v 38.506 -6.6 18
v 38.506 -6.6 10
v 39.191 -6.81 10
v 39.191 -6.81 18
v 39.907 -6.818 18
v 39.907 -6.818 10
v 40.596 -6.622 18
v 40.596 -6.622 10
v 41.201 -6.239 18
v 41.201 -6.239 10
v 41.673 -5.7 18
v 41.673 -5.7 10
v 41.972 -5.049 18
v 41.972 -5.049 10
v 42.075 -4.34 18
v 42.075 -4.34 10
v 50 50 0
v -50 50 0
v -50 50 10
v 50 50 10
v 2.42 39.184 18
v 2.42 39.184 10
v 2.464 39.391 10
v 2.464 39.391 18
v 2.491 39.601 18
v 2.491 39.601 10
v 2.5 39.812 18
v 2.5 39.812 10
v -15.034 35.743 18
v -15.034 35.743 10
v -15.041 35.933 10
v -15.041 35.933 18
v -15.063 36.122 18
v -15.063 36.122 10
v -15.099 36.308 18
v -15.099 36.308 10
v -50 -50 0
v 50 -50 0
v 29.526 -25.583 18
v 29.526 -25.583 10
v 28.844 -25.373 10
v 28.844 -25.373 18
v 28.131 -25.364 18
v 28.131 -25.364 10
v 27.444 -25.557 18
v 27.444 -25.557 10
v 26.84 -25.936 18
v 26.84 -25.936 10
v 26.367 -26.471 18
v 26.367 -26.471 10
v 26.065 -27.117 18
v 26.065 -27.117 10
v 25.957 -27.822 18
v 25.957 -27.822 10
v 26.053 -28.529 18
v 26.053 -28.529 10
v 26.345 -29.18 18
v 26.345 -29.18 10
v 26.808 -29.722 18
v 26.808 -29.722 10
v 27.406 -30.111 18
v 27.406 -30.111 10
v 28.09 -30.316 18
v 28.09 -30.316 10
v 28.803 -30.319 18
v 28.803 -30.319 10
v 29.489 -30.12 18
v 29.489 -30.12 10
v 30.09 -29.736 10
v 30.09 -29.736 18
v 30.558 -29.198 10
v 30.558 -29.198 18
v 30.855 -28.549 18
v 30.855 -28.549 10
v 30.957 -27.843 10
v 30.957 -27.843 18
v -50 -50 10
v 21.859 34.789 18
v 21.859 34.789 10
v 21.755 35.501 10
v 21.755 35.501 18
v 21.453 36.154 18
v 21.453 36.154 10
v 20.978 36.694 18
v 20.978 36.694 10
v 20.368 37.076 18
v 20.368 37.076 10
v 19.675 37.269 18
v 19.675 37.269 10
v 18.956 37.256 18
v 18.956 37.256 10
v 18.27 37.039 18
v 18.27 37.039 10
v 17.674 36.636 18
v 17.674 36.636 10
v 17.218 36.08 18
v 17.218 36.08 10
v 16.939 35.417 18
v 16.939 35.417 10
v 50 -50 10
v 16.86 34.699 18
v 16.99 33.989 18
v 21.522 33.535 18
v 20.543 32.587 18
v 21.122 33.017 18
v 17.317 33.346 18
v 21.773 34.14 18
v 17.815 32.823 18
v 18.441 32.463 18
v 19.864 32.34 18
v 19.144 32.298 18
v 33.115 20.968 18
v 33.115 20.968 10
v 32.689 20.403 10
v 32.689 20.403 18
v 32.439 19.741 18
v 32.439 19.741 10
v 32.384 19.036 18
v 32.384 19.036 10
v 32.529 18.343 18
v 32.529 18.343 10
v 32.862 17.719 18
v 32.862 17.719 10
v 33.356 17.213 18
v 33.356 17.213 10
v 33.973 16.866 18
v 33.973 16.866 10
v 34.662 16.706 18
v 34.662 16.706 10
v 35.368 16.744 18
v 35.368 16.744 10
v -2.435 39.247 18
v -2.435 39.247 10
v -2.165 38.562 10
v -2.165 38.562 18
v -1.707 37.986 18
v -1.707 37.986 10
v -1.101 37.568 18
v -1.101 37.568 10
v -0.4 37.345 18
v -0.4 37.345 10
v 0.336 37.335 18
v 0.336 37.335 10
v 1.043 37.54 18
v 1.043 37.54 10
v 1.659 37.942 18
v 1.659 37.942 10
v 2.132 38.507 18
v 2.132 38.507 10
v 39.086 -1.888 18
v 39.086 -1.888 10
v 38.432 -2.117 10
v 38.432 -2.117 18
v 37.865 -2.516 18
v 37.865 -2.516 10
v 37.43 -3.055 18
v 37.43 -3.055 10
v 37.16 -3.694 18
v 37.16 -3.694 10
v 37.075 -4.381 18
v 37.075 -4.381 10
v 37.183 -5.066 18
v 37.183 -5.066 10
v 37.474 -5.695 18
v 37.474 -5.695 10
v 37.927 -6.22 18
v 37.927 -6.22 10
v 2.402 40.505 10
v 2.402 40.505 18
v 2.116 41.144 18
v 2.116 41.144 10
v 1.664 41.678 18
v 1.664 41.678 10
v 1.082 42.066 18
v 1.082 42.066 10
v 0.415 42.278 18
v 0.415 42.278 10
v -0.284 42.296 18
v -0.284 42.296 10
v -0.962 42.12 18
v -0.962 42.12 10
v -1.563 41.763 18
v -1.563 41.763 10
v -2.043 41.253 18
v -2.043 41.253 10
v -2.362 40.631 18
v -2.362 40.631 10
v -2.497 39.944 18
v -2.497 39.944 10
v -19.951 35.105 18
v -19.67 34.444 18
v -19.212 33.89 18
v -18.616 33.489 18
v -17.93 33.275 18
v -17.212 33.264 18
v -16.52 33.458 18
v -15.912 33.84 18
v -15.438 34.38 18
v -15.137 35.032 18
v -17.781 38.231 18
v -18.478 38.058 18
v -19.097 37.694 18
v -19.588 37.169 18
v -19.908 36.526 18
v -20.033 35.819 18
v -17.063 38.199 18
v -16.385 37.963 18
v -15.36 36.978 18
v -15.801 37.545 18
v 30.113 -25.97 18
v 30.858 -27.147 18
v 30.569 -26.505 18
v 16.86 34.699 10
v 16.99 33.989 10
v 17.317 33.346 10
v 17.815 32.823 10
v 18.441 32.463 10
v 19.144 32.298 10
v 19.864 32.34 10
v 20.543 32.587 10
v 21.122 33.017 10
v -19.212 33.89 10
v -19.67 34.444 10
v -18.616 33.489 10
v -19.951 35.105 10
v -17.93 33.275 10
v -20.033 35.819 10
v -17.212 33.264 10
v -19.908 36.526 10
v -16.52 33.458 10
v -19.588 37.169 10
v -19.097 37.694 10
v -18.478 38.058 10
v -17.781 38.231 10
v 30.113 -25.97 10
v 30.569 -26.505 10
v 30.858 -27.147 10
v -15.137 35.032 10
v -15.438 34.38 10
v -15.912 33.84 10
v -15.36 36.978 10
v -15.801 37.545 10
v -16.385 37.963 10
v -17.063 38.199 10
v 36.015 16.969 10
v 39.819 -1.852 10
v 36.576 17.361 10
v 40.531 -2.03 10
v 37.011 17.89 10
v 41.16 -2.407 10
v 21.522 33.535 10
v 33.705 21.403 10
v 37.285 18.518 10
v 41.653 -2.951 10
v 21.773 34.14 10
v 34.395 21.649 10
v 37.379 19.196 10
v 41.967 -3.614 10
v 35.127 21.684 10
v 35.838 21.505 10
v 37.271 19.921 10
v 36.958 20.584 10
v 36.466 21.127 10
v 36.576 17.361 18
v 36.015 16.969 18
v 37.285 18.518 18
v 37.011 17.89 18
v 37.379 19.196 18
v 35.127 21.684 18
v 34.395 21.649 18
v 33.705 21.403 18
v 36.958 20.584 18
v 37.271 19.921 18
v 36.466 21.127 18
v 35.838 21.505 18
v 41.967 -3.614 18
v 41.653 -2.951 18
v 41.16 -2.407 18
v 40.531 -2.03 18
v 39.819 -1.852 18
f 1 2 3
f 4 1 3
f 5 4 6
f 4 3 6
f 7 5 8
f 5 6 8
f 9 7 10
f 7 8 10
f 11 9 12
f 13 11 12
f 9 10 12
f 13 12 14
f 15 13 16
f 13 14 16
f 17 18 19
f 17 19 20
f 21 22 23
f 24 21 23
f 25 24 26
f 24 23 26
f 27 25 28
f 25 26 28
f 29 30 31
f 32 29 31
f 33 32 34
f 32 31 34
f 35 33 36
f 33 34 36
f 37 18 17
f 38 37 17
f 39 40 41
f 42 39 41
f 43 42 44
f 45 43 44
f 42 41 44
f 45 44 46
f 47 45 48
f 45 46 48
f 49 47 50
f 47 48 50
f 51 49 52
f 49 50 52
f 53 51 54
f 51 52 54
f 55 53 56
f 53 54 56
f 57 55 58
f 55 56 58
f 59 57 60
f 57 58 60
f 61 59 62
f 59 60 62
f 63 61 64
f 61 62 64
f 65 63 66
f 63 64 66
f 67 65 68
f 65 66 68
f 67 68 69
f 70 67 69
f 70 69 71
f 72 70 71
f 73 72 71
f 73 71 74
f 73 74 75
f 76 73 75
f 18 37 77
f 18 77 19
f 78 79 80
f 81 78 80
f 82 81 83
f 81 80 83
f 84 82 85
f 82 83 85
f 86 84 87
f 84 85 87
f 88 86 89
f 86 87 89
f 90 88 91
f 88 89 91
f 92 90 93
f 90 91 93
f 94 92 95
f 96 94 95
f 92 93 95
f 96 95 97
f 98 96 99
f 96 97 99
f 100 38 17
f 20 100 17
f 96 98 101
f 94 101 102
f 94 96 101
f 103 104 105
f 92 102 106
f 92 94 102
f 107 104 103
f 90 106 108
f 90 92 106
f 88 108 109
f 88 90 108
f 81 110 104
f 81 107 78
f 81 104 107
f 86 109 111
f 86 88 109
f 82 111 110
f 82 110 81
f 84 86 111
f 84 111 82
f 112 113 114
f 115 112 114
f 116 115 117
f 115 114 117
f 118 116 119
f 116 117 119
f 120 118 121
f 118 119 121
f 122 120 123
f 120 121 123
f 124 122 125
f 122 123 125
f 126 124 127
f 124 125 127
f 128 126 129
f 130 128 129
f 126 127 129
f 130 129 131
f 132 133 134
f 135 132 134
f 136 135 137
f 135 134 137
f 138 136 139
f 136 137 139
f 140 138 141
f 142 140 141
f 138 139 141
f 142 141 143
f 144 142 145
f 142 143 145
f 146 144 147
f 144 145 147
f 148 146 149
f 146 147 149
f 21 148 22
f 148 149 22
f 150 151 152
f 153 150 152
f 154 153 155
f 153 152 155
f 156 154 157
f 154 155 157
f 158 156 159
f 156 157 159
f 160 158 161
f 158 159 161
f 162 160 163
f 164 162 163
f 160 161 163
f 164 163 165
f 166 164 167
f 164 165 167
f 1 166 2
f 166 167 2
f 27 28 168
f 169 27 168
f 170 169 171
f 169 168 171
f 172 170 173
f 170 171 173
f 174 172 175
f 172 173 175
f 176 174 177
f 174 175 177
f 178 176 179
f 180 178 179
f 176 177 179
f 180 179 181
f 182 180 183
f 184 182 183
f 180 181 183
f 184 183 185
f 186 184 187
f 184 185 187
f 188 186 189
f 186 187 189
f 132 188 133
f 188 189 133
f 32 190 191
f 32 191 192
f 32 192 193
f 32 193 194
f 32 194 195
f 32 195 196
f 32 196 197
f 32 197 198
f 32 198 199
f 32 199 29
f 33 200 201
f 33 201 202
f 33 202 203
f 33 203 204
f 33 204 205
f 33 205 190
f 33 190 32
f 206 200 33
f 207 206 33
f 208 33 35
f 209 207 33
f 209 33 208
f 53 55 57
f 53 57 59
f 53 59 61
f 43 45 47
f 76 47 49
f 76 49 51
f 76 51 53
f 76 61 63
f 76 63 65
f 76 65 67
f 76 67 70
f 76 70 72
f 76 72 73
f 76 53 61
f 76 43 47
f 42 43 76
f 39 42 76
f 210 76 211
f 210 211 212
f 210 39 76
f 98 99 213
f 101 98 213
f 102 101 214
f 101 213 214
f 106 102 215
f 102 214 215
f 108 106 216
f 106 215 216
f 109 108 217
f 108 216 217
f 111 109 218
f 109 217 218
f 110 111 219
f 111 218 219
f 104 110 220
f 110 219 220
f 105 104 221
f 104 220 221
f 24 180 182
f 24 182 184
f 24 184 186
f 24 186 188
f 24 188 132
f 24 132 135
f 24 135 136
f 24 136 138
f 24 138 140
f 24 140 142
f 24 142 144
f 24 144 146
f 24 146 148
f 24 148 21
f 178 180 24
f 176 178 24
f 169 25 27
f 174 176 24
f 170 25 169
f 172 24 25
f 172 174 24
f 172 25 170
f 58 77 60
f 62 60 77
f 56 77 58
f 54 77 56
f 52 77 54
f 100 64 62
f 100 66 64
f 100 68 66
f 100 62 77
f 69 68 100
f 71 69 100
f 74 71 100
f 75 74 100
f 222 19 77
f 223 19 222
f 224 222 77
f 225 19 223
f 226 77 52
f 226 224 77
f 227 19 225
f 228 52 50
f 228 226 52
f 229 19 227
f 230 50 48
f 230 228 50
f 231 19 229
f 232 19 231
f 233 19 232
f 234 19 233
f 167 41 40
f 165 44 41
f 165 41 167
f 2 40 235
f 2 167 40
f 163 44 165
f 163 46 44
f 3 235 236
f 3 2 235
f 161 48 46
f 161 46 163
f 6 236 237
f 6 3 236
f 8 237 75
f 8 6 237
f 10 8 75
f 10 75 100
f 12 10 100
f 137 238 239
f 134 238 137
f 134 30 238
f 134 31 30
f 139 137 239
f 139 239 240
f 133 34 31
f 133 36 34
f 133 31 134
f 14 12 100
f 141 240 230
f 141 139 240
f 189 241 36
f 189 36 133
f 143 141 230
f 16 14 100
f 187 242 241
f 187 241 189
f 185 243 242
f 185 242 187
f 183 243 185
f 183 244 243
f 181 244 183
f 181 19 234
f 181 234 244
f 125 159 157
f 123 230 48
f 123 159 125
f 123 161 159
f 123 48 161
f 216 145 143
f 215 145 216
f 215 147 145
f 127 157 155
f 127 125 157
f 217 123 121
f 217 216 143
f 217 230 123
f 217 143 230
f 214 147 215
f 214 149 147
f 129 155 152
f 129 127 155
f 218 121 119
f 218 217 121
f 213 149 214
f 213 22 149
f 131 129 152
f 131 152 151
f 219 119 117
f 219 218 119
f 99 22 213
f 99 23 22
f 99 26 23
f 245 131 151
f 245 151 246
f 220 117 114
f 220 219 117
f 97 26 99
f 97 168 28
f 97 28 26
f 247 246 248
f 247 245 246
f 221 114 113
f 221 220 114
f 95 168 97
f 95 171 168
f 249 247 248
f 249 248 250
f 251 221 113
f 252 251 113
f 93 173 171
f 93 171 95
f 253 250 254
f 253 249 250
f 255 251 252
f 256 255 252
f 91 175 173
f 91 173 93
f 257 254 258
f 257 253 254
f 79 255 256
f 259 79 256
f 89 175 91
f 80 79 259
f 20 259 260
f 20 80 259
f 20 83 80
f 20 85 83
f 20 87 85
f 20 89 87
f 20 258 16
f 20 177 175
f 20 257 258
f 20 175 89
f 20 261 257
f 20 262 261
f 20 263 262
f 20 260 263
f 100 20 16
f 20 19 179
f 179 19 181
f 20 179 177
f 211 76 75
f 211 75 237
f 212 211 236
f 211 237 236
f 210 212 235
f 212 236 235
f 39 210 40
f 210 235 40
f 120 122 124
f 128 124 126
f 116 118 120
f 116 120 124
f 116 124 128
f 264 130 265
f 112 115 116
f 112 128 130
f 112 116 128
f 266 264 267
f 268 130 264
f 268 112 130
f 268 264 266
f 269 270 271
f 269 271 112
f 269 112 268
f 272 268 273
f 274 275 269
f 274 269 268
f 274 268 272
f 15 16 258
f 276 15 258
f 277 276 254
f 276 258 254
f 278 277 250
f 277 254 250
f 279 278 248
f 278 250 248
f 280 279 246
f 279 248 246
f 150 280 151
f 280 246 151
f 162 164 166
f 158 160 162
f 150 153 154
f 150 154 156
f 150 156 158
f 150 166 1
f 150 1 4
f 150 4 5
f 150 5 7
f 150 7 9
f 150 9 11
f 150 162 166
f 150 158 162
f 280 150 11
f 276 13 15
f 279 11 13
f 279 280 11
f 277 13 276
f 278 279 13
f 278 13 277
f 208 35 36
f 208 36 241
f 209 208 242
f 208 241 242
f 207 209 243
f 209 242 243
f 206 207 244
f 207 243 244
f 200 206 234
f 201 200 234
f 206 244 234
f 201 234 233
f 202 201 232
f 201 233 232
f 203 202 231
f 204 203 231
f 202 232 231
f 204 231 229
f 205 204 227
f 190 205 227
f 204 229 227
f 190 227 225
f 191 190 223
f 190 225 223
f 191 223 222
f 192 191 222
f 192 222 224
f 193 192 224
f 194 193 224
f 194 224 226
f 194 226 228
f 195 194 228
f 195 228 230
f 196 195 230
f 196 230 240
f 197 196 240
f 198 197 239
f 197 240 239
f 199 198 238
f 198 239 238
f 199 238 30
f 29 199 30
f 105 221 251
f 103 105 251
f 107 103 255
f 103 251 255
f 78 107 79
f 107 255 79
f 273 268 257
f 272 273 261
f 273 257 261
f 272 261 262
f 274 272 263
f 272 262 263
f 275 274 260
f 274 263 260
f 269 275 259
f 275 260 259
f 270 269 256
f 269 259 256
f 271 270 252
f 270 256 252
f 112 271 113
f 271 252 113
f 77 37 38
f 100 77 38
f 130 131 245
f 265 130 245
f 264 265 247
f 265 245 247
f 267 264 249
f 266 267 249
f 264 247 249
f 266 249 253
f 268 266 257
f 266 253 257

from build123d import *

# Parameters (mm, degrees)
F0_W     = 100
F0_H     = 100
F1_DEPTH = 10
F3_DEPTH = 8


with BuildPart() as f1:
    # F0 (on Top) → F1 (new body)
    with BuildSketch(Plane.XY):
        Rectangle(F0_W, F0_H)
    extrude(amount=F1_DEPTH)

    # F2 (on face) → F3 (join)
    with BuildSketch(Plane.XY.offset(10)):
        with BuildLine():
            ThreePointArc((-15.098755, 36.308361), (-20.017806, 35.458787), (-15.034038, 35.743209))
            ThreePointArc((-15.034038, 35.743209), (-15.05027, 36.027632), (-15.098755, 36.308361))
        make_face()
        with BuildLine():
            ThreePointArc((30.956892, -27.842858), (30.569075, -26.505442), (29.525946, -25.582964))
            ThreePointArc((29.525946, -25.582964), (26.344709, -29.180275), (30.956892, -27.842858))
        make_face()
        with BuildLine():
            ThreePointArc((42.075047, -4.339951), (41.160451, -2.40695), (39.085853, -1.888281))
            Line((39.085853, -1.888281), (39.575047, -4.339951))
            Line((39.575047, -4.339951), (38.505993, -6.599846))
            ThreePointArc((38.505993, -6.599846), (40.912463, -6.452134), (42.075047, -4.339951))
        make_face()
        with BuildLine():
            Line((39.575047, -4.339951), (39.085853, -1.888281))
            ThreePointArc((39.085853, -1.888281), (37.093767, -4.034577), (38.505993, -6.599846))
            Line((38.505993, -6.599846), (39.575047, -4.339951))
        make_face()
        with BuildLine():
            ThreePointArc((37.378786, 19.196088), (35.838191, 21.504668), (33.115153, 20.967979))
            Line((33.115153, 20.967979), (34.878786, 19.196088))
            Line((34.878786, 19.196088), (35.36798, 16.744417))
            ThreePointArc((35.36798, 16.744417), (36.811787, 17.610683), (37.378786, 19.196088))
        make_face()
        with BuildLine():
            Line((34.878786, 19.196088), (33.115153, 20.967979))
            ThreePointArc((33.115153, 20.967979), (32.67296, 18.019511), (35.36798, 16.744417))
            Line((35.36798, 16.744417), (34.878786, 19.196088))
        make_face()
        with BuildLine():
            ThreePointArc((21.858815, 34.78873), (19.675335, 37.268612), (16.938963, 35.416677))
            Line((16.938963, 35.416677), (19.358815, 34.78873))
            Line((19.358815, 34.78873), (21.122448, 33.016839))
            ThreePointArc((21.122448, 33.016839), (21.667395, 33.829325), (21.858815, 34.78873))
        make_face()
        with BuildLine():
            Line((19.358815, 34.78873), (16.938963, 35.416677))
            ThreePointArc((16.938963, 35.416677), (18.114845, 32.620197), (21.122448, 33.016839))
            Line((21.122448, 33.016839), (19.358815, 34.78873))
        make_face()
        with BuildLine():
            ThreePointArc((2.5, 39.812303), (-0.284423, 42.296071), (-2.435283, 39.247151))
            Line((-2.435283, 39.247151), (0, 39.812303))
            Line((0, 39.812303), (2.419852, 39.184357))
            ThreePointArc((2.419852, 39.184357), (2.479882, 39.495783), (2.5, 39.812303))
        make_face()
        with BuildLine():
            Line((0, 39.812303), (-2.435283, 39.247151))
            ThreePointArc((-2.435283, 39.247151), (-0.032331, 37.312512), (2.419852, 39.184357))
            Line((2.419852, 39.184357), (0, 39.812303))
        make_face()
    extrude(amount=F3_DEPTH)


solid = f1.part
